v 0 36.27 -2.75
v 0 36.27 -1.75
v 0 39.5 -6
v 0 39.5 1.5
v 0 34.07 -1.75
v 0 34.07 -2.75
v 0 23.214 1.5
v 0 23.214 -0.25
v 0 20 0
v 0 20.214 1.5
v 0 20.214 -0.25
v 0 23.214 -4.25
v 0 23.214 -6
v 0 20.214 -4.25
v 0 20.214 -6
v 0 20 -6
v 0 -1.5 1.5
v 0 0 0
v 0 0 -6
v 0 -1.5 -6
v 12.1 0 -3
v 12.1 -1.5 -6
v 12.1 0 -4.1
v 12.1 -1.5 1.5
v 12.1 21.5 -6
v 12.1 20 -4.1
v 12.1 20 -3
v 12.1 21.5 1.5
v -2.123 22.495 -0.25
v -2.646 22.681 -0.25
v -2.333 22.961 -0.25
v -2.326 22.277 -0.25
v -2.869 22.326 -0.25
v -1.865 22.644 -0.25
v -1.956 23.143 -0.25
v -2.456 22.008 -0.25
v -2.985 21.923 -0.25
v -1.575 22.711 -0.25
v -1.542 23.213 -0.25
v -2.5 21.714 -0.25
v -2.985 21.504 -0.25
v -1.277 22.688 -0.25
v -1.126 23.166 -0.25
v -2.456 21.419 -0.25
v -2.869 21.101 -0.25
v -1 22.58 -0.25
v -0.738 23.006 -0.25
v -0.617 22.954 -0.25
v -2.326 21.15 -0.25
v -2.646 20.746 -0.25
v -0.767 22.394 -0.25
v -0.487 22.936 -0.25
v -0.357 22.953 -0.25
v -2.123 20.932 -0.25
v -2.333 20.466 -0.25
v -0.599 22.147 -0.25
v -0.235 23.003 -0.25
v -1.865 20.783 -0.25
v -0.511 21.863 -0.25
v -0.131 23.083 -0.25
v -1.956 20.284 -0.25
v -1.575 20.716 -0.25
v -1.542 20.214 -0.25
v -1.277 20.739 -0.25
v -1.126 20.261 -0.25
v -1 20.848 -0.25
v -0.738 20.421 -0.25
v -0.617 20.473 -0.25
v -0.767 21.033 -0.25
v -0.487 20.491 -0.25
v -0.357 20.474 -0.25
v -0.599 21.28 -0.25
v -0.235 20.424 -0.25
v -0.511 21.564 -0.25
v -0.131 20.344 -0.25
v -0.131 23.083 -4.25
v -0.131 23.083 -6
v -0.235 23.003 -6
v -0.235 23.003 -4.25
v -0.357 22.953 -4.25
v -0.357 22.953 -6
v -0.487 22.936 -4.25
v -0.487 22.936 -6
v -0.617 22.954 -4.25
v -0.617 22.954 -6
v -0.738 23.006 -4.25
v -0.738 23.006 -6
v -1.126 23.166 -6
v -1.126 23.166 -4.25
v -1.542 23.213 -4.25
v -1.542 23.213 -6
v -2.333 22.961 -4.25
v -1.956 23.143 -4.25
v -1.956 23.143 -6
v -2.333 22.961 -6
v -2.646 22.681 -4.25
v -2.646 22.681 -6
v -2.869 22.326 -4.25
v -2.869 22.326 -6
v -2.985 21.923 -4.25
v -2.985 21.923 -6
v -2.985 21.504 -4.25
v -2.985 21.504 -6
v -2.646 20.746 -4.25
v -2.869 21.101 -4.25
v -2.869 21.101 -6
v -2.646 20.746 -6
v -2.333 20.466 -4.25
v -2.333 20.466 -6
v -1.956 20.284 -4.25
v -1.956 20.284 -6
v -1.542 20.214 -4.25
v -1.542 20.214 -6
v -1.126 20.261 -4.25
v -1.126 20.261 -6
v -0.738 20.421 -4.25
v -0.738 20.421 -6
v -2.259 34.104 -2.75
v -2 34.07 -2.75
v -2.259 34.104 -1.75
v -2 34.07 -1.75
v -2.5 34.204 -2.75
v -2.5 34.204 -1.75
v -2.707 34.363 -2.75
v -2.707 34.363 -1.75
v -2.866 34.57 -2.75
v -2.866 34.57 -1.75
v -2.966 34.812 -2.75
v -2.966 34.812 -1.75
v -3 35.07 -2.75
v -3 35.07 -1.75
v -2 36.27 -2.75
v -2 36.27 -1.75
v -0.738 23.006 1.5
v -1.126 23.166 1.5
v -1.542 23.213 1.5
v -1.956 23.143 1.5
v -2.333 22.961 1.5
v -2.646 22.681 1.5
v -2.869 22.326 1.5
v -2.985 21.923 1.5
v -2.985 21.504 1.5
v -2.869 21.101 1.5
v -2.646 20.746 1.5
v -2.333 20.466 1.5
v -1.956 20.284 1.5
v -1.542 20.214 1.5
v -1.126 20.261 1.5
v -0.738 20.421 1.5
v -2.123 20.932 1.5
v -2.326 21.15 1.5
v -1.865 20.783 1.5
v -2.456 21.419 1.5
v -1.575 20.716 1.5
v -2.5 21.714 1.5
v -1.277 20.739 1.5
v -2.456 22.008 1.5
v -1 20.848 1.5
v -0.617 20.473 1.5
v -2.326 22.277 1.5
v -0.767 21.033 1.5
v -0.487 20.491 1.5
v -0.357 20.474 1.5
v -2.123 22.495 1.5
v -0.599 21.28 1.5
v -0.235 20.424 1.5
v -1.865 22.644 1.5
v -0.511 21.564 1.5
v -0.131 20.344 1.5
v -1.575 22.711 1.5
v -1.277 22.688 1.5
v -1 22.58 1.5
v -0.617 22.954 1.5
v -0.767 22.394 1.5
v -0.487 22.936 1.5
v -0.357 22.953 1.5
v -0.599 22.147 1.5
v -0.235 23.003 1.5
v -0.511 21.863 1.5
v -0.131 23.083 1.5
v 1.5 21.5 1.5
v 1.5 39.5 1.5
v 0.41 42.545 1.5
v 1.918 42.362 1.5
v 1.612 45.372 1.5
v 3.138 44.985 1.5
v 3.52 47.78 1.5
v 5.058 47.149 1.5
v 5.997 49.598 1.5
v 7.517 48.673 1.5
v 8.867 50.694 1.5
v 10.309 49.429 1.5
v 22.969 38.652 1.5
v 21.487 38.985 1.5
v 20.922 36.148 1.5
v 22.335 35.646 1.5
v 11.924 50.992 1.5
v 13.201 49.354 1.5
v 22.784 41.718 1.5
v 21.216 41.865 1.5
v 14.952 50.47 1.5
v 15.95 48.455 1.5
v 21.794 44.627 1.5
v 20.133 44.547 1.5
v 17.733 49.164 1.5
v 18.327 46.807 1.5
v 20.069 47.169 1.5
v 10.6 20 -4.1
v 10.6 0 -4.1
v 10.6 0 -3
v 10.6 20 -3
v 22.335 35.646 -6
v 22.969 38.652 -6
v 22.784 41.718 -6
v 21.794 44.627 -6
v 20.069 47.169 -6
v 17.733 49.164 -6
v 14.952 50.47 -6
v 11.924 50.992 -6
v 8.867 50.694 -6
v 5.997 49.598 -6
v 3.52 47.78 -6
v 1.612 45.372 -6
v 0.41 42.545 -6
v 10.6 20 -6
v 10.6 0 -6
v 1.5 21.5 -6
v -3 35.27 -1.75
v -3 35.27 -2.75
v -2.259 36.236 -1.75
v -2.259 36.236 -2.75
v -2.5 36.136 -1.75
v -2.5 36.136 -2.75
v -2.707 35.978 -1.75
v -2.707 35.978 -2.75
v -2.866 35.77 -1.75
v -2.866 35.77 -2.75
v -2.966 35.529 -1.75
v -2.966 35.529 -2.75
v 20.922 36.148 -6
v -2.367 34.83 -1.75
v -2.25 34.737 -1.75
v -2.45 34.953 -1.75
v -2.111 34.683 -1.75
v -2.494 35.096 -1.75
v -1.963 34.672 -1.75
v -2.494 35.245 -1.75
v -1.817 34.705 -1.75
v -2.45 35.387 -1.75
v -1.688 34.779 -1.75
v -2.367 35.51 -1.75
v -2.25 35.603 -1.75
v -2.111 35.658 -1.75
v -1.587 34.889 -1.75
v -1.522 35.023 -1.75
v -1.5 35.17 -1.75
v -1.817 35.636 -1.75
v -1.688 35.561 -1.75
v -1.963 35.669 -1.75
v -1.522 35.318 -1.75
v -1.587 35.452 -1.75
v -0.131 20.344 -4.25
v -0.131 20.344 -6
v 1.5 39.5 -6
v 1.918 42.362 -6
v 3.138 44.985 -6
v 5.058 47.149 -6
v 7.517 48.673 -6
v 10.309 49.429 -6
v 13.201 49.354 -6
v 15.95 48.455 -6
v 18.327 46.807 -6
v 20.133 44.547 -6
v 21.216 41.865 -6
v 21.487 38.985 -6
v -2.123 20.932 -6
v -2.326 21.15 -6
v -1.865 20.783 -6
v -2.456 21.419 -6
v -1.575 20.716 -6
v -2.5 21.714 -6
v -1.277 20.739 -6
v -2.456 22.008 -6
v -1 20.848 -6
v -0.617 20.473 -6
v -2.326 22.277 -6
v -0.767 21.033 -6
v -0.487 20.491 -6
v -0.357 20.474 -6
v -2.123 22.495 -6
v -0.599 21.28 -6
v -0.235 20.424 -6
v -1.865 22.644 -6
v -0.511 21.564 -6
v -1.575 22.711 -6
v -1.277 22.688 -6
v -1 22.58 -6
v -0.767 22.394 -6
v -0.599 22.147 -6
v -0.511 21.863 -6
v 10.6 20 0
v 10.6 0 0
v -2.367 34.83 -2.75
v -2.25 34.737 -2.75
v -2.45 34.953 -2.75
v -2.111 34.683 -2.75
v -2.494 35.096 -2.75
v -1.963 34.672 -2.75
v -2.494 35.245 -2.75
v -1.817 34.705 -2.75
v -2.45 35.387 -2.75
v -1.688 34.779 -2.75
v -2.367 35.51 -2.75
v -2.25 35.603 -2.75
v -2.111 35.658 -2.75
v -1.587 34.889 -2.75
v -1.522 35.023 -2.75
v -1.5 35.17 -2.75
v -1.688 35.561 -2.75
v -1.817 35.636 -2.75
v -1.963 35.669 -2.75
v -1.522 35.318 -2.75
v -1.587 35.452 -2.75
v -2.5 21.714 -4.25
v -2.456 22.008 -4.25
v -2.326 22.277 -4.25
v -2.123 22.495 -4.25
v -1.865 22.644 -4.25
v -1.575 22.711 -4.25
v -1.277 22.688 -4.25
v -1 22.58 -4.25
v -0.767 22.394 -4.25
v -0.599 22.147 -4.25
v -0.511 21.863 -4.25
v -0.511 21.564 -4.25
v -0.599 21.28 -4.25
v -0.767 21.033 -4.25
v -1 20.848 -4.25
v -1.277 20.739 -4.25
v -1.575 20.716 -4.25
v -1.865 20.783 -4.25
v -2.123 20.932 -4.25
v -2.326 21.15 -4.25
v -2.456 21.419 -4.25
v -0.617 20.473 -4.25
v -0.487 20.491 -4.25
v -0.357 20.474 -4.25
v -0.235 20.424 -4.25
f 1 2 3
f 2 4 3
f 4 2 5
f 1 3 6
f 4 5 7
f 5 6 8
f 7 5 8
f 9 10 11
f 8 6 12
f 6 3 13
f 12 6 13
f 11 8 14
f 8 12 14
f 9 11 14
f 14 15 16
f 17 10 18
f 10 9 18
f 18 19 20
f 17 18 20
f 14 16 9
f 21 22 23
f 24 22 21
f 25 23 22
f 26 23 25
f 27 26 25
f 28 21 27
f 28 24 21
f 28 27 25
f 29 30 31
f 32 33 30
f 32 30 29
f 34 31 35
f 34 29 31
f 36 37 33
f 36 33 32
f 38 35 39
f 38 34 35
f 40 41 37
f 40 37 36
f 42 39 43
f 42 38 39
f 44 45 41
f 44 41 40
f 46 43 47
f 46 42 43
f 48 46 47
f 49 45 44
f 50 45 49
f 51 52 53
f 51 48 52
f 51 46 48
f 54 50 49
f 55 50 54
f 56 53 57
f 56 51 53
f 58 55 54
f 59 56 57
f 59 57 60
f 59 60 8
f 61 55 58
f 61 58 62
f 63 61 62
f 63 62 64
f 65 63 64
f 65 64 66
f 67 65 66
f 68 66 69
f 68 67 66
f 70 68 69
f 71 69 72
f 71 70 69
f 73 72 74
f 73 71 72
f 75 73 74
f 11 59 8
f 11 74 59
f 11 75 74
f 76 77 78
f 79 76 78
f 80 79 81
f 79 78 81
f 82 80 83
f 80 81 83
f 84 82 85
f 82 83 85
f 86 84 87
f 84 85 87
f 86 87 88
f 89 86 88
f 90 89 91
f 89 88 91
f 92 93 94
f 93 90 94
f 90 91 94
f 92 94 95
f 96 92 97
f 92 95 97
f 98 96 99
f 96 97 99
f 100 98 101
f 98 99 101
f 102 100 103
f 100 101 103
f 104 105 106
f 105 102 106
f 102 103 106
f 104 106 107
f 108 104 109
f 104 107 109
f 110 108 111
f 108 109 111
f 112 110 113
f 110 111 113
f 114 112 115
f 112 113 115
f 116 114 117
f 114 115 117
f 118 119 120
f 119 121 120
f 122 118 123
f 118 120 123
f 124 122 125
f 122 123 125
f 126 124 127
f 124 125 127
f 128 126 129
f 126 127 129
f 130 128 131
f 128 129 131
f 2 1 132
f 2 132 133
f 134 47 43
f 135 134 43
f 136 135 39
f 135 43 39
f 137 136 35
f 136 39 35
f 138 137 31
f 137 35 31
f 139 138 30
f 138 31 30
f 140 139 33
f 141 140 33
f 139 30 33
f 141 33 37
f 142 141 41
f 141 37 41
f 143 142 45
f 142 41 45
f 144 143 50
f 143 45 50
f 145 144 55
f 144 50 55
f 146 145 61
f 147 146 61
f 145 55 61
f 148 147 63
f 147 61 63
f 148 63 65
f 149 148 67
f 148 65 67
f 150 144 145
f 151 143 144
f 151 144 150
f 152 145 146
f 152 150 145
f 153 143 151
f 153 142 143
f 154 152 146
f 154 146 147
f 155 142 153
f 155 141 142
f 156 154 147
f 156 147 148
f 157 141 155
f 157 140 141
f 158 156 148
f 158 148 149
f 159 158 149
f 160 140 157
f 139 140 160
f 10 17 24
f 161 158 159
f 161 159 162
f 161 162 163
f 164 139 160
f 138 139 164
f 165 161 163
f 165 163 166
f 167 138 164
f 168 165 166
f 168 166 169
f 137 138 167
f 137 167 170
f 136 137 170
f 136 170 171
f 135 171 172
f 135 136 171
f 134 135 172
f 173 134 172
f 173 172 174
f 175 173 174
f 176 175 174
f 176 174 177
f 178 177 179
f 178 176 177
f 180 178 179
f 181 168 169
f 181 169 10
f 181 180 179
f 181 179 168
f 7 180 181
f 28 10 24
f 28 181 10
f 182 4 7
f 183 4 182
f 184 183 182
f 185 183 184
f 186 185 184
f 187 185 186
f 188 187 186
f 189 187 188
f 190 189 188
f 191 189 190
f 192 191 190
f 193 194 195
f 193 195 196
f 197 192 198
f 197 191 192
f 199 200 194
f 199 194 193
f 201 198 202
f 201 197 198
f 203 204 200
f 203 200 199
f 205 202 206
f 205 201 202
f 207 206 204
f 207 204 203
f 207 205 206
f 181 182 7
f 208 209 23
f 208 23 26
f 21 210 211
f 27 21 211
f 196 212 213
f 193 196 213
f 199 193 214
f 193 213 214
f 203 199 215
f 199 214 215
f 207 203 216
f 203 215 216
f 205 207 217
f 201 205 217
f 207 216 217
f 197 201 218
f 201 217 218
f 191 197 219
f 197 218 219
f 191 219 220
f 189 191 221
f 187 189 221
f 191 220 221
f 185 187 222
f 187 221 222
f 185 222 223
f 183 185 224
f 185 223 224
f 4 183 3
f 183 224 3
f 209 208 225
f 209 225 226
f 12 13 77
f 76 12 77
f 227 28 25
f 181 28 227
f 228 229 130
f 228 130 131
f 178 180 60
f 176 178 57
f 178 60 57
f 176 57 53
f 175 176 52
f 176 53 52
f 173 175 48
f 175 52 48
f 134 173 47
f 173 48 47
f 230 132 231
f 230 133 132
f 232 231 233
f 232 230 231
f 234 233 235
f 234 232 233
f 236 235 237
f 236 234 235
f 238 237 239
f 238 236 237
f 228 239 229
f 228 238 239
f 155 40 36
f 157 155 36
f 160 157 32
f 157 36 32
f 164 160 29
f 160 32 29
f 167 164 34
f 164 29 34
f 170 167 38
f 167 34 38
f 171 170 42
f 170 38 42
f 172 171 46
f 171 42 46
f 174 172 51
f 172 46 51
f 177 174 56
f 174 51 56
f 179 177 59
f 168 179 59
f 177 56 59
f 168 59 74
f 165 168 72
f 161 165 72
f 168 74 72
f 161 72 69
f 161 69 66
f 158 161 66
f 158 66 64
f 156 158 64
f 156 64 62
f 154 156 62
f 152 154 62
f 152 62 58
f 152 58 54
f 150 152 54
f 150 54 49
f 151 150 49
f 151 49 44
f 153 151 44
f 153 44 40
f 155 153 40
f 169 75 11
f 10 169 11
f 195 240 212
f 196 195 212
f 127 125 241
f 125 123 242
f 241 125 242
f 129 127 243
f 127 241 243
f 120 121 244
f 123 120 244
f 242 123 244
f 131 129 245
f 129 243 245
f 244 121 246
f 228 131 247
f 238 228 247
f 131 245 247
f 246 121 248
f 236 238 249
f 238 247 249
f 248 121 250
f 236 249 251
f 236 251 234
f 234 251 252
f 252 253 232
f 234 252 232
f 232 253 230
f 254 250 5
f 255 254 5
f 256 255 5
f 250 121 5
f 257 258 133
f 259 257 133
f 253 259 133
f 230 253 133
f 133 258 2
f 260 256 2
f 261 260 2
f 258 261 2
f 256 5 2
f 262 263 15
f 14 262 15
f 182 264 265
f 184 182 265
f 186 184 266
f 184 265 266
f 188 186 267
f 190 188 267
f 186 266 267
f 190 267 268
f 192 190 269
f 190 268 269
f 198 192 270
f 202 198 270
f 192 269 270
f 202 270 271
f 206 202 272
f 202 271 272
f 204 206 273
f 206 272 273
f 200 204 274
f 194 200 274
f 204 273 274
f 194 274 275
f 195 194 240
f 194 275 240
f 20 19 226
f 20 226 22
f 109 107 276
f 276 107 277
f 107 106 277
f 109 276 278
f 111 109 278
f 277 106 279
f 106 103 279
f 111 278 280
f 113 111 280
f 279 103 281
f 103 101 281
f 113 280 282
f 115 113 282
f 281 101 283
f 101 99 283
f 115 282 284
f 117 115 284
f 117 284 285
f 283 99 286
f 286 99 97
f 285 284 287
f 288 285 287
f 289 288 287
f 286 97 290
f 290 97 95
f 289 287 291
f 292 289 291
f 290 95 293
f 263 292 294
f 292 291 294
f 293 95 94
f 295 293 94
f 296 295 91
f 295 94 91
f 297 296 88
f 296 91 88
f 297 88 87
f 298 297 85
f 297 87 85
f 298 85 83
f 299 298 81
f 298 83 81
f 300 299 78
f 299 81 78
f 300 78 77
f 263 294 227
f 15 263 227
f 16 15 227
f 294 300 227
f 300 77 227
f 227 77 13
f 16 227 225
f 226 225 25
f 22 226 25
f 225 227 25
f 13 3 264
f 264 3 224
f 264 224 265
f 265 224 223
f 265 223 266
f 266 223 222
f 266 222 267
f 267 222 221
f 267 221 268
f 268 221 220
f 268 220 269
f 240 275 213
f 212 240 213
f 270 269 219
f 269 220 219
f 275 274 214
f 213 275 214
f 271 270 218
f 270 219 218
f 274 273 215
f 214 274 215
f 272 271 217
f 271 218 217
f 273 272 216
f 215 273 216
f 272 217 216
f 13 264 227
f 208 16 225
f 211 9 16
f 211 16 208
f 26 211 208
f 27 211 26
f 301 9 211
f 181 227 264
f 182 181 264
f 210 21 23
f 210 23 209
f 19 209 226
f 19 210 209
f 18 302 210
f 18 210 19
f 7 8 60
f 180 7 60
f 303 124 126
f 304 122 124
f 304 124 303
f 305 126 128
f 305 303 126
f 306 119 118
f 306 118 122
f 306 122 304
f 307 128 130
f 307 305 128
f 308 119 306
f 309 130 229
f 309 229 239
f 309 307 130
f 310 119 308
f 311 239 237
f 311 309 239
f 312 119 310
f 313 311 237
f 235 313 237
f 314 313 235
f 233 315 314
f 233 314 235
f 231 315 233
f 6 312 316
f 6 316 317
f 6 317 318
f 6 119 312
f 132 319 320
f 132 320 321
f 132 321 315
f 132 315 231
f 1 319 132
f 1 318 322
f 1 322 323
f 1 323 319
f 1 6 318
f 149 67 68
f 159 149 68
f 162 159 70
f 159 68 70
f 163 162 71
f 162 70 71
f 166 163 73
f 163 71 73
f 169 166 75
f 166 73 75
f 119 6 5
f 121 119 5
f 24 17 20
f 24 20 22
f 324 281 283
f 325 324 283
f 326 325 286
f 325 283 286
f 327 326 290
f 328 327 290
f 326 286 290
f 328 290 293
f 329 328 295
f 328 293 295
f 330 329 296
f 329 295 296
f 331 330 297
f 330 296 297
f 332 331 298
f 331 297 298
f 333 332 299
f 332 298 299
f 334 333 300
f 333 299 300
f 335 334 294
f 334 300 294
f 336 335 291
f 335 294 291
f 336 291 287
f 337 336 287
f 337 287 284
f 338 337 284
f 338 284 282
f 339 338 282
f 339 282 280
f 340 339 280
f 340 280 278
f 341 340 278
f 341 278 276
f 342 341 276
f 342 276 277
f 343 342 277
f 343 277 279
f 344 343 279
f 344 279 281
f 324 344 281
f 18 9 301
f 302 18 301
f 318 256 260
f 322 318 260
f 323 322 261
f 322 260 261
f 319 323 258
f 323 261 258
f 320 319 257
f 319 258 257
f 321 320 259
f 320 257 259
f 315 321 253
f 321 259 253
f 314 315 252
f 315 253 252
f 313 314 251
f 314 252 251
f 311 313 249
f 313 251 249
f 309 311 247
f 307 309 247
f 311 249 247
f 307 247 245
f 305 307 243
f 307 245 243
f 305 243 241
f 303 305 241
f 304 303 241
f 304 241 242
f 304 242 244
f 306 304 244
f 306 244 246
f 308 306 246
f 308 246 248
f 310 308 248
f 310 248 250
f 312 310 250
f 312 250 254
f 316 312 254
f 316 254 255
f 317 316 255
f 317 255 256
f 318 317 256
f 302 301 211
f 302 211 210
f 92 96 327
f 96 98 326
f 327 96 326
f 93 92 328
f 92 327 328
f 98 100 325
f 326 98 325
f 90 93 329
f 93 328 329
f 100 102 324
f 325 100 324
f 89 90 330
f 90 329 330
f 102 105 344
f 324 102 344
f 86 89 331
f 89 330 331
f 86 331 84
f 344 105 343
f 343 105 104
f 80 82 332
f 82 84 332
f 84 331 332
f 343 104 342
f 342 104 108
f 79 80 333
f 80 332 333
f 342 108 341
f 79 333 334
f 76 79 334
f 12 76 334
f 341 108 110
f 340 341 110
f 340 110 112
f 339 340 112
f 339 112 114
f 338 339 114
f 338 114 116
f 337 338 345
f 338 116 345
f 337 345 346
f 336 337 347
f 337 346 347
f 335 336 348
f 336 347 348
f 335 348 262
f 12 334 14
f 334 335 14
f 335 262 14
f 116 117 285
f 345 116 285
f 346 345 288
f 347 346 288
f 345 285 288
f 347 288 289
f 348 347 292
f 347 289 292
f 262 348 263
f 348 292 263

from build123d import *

# Parameters (mm, degrees)
CROQUIS1_W              = 10.6
CROQUIS1_H              = 20
SALIENTE_EXTRUIR1_DEPTH = 1.5
SALIENTE_EXTRUIR2_DEPTH = 7.5
CROQUIS23_W             = 1.1
CROQUIS23_H             = 20
CORTAR_EXTRUIR1_DEPTH   = 25.710524074
SALIENTE_EXTRUIR3_DEPTH = 7.5
CROQUIS25_R             = 1
SALIENTE_EXTRUIR5_DEPTH = 7.5
CROQUIS26_W             = 6.08430057
CROQUIS26_H             = 4
CORTAR_EXTRUIR2_DEPTH   = 7.5
CROQUIS27_W             = 1
CROQUIS27_H             = 2.2
SALIENTE_EXTRUIR6_DEPTH = 3
REDONDEO1_R             = 1
CROQUIS28_R             = 0.5
CORTAR_EXTRUIR3_DEPTH   = 5


with BuildPart() as part:
    # Croquis1 → Saliente-Extruir1 (new body)
    with BuildSketch(Plane.XY):
        with Locations((5.3, 10)):
            Rectangle(CROQUIS1_W, CROQUIS1_H)
    extrude(amount=SALIENTE_EXTRUIR1_DEPTH)

    # Croquis22 → Saliente-Extruir2 (add)
    with BuildSketch(Plane.XY.offset(1.5)):
        Polygon((0, -1.5), (12.1, -1.5), (12.1, 21.5), (0, 21.5), (0, 20), (10.6, 20), (10.6, 0), (0, 0), align=None)
    extrude(amount=-SALIENTE_EXTRUIR2_DEPTH)

    # Croquis23 → Cortar-Extruir1 (cut, through all)
    with BuildSketch(Plane.ZY.offset(-10.6)):
        with Locations((-3.55, 10)):
            Rectangle(CROQUIS23_W, CROQUIS23_H)
    extrude(amount=-CORTAR_EXTRUIR1_DEPTH, mode=Mode.SUBTRACT)

    # Croquis24 → Saliente-Extruir3 (add)
    with BuildSketch(Plane(origin=(0, 0, -6), x_dir=(-1, 0, 0), z_dir=(0, 0, -1))):
        with BuildLine():
            Line((-1.5, 21.5), (-1.5, 39.5))
            ThreePointArc((-1.5, 39.5), (-13.200559707, 49.354344051), (-20.921619337, 36.148419914))
            Line((-20.921619337, 36.148419914), (-22.334862237, 35.645682901))
            ThreePointArc((-22.334862237, 35.645682901), (-13.455643663, 50.832495659), (0, 39.5))
            Line((0, 39.5), (0, 21.5))
            Line((0, 21.5), (-1.5, 21.5))
        make_face()
    extrude(amount=-SALIENTE_EXTRUIR3_DEPTH)

    # Croquis25 → Saliente-Extruir5 (add)
    with BuildSketch(Plane(origin=(0, 0, -6), x_dir=(-1, 0, 0), z_dir=(0, 0, -1))):
        with BuildLine():
            Line((0, 20.21354083), (0, 23.21354083))
            Line((0, 23.21354083), (0.130693606, 23.082847224))
            ThreePointArc((0.130693606, 23.082847224), (0.421244851, 22.940385766), (0.738185248, 23.005685668))
            ThreePointArc((0.738185248, 23.005685668), (3, 21.71354083), (0.738185248, 20.421395992))
            ThreePointArc((0.738185248, 20.421395992), (0.421244851, 20.486695894), (0.130693606, 20.344234436))
            Line((0.130693606, 20.344234436), (0, 20.21354083))
        make_face()
        with Locations((1.5, 21.71354083)):
            Circle(CROQUIS25_R, mode=Mode.SUBTRACT)
    extrude(amount=-SALIENTE_EXTRUIR5_DEPTH)

    # Croquis26 → Cortar-Extruir2 (cut)
    with BuildSketch(Plane.XZ.offset(-20)):
        with Locations((-3.042150285, -2.25)):
            Rectangle(CROQUIS26_W, CROQUIS26_H)
    extrude(amount=-CORTAR_EXTRUIR2_DEPTH, mode=Mode.SUBTRACT)

    # Croquis27 → Saliente-Extruir6 (add)
    with BuildSketch(Plane.ZY):
        with Locations((-2.25, 35.170410703)):
            Rectangle(CROQUIS27_W, CROQUIS27_H)
    extrude(amount=SALIENTE_EXTRUIR6_DEPTH)

    # Redondeo1
    redondeo1_edges = [part.edges().sort_by_distance(p)[0] for p in [
        (-3, 34.070410703, -2.25),
        (-3, 36.270410703, -2.25),
    ]]
    fillet(redondeo1_edges, radius=REDONDEO1_R)

    # Croquis28 → Cortar-Extruir3 (cut)
    with BuildSketch(Plane.XY.offset(-1.75)):
        with Locations((-2, 35.170410703)):
            Circle(CROQUIS28_R)
    extrude(amount=-CORTAR_EXTRUIR3_DEPTH, mode=Mode.SUBTRACT)


solid = part.part
